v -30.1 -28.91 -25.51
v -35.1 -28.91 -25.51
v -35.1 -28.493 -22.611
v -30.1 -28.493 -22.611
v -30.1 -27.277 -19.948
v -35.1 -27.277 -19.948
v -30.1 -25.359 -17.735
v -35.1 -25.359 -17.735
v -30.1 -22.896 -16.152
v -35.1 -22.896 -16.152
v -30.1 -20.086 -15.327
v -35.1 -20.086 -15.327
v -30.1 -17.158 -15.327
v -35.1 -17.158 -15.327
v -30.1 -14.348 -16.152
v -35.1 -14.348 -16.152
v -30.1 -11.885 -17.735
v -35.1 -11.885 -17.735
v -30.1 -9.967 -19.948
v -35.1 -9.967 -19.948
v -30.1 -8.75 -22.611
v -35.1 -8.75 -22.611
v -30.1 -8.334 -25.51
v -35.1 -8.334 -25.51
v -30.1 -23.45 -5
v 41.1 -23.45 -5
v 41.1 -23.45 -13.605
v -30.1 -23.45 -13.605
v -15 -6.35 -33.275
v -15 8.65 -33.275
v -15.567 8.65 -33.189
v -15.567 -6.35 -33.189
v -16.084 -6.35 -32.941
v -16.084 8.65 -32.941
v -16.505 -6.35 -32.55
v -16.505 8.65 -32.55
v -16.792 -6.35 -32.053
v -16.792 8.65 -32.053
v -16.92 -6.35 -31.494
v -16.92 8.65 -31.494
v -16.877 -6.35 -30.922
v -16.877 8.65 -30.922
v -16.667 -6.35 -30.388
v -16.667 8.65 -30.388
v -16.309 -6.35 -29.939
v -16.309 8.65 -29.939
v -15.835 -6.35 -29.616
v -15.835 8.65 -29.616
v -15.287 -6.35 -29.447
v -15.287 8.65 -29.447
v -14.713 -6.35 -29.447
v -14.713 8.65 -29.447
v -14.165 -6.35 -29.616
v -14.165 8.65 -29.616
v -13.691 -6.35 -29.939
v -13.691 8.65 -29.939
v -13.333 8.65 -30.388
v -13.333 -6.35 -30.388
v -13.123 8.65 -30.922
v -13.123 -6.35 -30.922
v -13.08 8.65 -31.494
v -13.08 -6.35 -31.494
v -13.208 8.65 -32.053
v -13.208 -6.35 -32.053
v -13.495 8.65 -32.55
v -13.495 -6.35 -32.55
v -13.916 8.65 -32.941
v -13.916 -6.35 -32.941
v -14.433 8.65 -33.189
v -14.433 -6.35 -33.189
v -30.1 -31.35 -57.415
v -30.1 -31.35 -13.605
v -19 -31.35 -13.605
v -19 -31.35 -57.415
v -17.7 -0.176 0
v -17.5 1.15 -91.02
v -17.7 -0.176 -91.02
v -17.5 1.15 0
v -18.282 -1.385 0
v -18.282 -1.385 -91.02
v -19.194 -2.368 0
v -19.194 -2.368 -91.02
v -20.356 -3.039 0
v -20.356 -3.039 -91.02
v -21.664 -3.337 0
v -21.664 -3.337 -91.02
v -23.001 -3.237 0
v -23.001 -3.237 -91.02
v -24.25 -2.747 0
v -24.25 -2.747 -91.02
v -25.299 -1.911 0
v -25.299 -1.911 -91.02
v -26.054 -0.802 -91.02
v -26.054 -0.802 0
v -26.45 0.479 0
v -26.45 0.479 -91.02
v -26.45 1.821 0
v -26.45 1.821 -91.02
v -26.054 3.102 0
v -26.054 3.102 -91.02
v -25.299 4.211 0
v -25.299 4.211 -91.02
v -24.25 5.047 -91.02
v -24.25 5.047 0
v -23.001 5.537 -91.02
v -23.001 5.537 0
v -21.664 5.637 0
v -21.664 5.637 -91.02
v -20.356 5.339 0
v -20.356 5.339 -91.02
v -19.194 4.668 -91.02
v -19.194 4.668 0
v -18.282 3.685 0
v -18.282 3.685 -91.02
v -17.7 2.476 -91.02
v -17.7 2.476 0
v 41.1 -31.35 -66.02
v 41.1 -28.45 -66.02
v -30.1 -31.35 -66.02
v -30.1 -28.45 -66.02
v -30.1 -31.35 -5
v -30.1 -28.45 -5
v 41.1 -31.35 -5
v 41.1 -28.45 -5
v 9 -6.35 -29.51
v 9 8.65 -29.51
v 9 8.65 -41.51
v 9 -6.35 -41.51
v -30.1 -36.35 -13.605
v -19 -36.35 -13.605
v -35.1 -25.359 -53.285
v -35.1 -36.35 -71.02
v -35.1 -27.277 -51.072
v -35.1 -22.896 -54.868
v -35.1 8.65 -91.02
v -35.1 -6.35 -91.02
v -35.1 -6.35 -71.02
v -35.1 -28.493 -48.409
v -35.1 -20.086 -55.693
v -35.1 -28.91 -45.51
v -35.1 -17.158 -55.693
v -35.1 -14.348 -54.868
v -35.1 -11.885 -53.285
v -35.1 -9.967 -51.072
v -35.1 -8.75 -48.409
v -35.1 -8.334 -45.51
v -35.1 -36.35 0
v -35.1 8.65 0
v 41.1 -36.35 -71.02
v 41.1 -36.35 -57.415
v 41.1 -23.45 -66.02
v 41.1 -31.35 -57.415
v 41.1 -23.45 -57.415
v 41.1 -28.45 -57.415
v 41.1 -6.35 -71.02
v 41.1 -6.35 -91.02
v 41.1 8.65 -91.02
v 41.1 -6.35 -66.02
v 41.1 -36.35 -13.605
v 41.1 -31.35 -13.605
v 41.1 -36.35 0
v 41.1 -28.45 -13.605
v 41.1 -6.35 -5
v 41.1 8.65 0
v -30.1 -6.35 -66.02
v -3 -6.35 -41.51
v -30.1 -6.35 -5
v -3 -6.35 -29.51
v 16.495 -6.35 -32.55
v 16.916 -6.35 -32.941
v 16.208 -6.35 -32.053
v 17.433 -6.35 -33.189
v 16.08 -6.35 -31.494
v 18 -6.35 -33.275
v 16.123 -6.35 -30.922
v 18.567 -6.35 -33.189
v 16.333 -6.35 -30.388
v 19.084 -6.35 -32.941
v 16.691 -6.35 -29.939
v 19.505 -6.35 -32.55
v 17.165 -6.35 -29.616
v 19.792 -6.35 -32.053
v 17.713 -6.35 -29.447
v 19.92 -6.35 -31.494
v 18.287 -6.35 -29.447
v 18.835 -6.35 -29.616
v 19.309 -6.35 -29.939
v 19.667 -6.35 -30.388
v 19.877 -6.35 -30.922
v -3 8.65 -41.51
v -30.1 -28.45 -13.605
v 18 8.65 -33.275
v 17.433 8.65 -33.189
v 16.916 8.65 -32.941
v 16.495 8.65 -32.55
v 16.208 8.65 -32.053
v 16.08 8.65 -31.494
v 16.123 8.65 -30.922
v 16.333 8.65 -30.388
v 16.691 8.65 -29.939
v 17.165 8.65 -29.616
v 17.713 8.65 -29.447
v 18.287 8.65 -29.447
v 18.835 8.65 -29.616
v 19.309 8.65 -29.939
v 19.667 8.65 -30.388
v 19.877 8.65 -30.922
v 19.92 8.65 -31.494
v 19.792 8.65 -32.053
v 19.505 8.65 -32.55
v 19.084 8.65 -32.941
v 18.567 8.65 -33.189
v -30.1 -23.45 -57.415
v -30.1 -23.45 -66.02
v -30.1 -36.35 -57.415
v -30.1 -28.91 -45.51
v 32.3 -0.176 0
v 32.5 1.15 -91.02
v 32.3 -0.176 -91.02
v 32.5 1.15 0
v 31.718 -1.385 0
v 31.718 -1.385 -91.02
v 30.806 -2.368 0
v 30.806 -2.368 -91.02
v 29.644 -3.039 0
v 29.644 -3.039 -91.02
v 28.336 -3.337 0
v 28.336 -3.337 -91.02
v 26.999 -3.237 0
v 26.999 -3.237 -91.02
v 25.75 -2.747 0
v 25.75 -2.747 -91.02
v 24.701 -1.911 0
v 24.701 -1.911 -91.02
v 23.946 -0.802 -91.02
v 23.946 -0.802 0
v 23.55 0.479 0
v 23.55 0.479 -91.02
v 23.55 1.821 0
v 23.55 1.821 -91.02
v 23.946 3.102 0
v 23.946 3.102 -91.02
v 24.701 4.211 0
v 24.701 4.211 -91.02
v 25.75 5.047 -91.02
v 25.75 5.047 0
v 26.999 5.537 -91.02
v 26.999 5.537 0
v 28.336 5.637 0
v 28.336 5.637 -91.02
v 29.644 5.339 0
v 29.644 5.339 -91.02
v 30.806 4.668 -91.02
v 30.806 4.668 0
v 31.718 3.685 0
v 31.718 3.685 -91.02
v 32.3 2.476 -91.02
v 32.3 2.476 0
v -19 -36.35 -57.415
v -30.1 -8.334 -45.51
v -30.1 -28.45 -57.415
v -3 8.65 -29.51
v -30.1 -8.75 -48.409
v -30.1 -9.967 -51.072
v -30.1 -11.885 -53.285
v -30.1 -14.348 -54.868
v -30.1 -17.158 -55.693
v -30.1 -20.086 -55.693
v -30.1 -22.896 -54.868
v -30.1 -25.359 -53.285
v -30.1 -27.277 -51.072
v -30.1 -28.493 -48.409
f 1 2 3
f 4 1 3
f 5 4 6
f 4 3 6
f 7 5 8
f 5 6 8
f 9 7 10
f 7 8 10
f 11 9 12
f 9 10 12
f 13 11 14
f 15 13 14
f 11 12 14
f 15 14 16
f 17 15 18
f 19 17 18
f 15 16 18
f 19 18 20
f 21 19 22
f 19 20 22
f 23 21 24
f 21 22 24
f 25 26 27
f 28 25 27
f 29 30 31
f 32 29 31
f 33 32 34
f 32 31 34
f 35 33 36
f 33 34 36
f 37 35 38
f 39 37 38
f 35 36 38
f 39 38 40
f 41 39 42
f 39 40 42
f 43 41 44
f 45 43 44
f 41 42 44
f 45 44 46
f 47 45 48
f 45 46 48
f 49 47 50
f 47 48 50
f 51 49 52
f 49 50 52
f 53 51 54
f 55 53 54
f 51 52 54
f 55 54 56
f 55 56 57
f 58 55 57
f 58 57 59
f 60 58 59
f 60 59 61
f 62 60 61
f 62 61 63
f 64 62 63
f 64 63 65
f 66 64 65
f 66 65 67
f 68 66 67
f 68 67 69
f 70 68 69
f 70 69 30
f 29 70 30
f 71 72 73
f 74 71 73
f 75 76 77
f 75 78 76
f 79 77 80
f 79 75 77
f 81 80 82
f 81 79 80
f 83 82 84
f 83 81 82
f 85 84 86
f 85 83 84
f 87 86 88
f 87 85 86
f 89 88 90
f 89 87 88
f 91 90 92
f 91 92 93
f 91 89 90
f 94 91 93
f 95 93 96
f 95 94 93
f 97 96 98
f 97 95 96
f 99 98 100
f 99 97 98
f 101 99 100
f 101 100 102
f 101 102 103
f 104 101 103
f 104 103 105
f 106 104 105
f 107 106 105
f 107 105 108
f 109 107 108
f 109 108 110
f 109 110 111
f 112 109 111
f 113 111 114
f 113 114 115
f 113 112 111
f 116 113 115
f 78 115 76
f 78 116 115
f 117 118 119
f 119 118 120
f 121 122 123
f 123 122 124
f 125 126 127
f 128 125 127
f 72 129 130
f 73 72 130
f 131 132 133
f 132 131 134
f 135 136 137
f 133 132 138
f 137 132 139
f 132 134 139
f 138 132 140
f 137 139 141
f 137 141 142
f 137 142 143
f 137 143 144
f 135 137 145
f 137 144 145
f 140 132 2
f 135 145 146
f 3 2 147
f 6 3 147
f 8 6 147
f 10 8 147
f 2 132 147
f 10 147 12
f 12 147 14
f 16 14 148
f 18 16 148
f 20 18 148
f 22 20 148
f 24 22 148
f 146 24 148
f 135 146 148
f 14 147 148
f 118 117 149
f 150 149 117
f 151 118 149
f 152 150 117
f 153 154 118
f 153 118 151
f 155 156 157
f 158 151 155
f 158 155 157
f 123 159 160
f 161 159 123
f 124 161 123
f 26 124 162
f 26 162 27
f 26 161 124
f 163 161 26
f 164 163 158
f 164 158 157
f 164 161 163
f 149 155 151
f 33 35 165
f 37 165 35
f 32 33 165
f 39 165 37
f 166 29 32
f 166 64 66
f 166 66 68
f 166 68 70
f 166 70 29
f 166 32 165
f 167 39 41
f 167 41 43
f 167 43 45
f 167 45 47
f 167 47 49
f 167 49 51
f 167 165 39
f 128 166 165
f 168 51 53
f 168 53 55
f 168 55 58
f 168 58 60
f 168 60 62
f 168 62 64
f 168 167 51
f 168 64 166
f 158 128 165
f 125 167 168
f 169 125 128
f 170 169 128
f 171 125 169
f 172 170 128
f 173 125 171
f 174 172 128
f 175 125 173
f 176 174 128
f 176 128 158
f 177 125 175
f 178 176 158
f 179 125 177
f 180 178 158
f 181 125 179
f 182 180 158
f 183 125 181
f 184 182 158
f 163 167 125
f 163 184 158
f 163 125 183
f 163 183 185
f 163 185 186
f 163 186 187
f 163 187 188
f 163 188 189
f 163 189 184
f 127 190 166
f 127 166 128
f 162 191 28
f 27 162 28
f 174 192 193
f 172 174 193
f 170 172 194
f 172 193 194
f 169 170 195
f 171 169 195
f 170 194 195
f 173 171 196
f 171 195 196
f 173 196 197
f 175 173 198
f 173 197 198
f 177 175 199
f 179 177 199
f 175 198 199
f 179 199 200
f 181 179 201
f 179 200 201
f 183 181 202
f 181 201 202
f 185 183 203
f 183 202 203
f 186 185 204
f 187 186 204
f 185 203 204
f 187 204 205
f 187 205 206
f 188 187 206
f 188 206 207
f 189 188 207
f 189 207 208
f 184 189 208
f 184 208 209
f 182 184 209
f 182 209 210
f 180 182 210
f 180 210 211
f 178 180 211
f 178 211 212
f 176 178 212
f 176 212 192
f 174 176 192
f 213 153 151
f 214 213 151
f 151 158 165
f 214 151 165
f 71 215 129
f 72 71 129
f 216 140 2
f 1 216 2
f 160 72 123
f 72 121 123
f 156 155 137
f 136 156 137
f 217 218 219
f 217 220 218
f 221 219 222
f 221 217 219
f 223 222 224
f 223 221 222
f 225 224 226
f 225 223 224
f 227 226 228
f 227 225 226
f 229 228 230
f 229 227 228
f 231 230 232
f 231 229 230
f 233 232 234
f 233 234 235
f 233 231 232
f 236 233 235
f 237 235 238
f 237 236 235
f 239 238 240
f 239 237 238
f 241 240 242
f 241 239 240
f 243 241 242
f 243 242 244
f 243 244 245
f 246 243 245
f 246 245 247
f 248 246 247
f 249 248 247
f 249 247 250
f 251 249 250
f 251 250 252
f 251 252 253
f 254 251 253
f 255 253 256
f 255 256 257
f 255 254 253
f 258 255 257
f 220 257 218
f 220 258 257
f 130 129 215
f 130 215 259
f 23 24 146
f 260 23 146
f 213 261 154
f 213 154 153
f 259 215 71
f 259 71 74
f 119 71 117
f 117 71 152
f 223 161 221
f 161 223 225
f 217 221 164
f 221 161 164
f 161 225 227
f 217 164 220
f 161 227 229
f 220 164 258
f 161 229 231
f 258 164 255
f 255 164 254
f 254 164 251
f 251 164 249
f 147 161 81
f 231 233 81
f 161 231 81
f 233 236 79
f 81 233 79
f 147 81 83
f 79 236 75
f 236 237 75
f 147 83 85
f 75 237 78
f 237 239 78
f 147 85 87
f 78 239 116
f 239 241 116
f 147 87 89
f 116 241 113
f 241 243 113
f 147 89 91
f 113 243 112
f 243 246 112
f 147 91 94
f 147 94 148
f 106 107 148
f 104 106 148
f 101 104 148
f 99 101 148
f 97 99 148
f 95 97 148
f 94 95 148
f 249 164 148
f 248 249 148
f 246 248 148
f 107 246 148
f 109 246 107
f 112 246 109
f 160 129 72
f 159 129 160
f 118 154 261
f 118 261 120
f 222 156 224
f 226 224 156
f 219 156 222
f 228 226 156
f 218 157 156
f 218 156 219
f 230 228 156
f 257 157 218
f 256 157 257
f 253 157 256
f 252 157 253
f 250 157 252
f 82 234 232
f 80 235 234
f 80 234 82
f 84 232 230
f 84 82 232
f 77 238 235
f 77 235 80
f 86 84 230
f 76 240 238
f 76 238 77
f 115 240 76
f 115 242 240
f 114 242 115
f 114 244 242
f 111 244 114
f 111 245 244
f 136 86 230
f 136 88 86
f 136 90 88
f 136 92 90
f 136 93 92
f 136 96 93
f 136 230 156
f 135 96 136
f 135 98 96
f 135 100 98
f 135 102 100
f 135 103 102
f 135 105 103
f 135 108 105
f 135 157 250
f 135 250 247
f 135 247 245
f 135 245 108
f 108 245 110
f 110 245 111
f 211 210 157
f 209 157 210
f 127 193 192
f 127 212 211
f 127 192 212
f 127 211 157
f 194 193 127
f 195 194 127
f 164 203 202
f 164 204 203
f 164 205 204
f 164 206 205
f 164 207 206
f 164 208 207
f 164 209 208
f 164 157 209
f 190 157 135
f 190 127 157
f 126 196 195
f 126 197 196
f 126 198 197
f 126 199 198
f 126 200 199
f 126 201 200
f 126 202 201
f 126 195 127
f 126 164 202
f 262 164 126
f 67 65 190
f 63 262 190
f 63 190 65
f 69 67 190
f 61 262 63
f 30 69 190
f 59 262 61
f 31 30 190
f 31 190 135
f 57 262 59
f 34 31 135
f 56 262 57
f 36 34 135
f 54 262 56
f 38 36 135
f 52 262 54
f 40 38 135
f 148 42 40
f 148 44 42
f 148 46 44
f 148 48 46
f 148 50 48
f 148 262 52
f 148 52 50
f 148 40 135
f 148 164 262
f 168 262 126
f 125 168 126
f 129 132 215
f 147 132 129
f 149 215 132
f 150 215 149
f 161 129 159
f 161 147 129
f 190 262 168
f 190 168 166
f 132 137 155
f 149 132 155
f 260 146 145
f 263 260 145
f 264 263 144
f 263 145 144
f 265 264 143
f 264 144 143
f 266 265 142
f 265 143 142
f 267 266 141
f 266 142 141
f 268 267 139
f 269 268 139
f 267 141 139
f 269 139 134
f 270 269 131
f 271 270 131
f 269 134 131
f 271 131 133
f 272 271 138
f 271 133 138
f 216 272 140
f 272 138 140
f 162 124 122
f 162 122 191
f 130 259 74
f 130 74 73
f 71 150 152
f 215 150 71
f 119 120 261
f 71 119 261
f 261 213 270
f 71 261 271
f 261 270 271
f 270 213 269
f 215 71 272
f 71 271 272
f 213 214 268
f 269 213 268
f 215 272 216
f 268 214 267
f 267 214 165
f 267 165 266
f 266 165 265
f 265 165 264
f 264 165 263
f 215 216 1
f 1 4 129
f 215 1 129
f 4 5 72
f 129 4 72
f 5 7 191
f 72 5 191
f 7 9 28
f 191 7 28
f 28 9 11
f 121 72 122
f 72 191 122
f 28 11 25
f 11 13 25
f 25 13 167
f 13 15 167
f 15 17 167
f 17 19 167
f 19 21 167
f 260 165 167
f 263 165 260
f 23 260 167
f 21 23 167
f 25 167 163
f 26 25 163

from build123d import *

# Parameters (mm, degrees)
SKETCH2_W                 = 76.2
SKETCH2_H                 = 15
SKETCH2_R                 = 3.96875
TOP_FAILED_HOLES_DEPTH    = 71.02
WALLS_DEPTH               = 45
SKETCH14_R                = 4.5
ROD_HOLES_DEPTH           = 90.746158135
SKETCH15_W                = 71.2
SKETCH15_H                = 8.605
BASE_HOLD_SYRINGE_DEPTH   = 5
SKETCH16_W                = 76.2
SKETCH16_H                = 15
SKETCH16_R                = 4.5
EXTENSION_FOR_MOTOR_DEPTH = 20
TRACK_AND_SCREWS_REACH    = 111.539
SKETCH6_R                 = 1.925
SKETCH6_W                 = 12
SKETCH6_H                 = 12
SECURE_SYRING_REACH       = 126.147
SKETCH18_W                = 8.605
SKETCH18_H                = 5
CUT_EXTRUDE1_REACH        = 126.147
SKETCH22_W                = 11.1
SKETCH22_H                = 43.81
BOSS_EXTRUDE1_DEPTH       = 5


with BuildPart() as part:
    # Sketch2 → Top + failed holes (new body)
    with BuildSketch(Plane.XY):
        with Locations((3, 1.15)):
            Rectangle(SKETCH2_W, SKETCH2_H)
        with Locations((-22, 1.15)):
            Circle(SKETCH2_R, mode=Mode.SUBTRACT)
        with Locations((28, 1.15)):
            Circle(SKETCH2_R, mode=Mode.SUBTRACT)
    extrude(amount=-TOP_FAILED_HOLES_DEPTH)

    # Sketch13 → Walls (add)
    with BuildSketch(Plane(origin=(0, 8.65, 0), x_dir=(1, 0, 0), z_dir=(0, 1, 0))):
        Polygon((-35.1, 71.02), (41.1, 71.02), (41.1, 66.02), (-30.1, 66.02), (-30.1, 5), (41.1, 5), (41.1, 0), (-35.1, 0), align=None)
    extrude(amount=-WALLS_DEPTH)

    # Sketch14 → Rod Holes (cut, through all)
    with BuildSketch(Plane.XY):
        with Locations((-22, 1.15)):
            Circle(SKETCH14_R)
        with Locations((28, 1.15)):
            Circle(SKETCH14_R)
    extrude(amount=-ROD_HOLES_DEPTH, mode=Mode.SUBTRACT)

    # Sketch15 → Base hold syringe (add)
    with BuildSketch(Plane.XZ.offset(36.35)):
        Polygon((41.1, -12.083250566), (41.1, -5), (-30.1, -5), (-30.1, -13.605), (41.1, -13.605), align=None)
        Polygon((41.1, 0), (-35.1, 0), (-35.1, -12.083250566), (-35.1, -13.605), (-30.1, -13.605), (-30.1, -5), (41.1, -5), align=None)
        with Locations((5.5, -61.7175)):
            Rectangle(SKETCH15_W, SKETCH15_H)
        Polygon((-30.1, -57.415), (-35.1, -57.415), (-35.1, -71.02), (41.1, -71.02), (41.1, -66.02), (-30.1, -66.02), align=None)
    extrude(amount=-BASE_HOLD_SYRINGE_DEPTH)

    # Sketch16 → extension for motor (add)
    with BuildSketch(Plane(origin=(0, 0, -71.02), x_dir=(-1, 0, 0), z_dir=(0, 0, -1))):
        with Locations((-3, 1.15)):
            Rectangle(SKETCH16_W, SKETCH16_H)
        with Locations(Location((-28, 1.15, 0), (0, 0, 180))):
            Circle(SKETCH16_R, mode=Mode.SUBTRACT)
        with Locations(Location((22, 1.15, 0), (0, 0, 180))):
            Circle(SKETCH16_R, mode=Mode.SUBTRACT)
    extrude(amount=EXTENSION_FOR_MOTOR_DEPTH)

    # Sketch6 → Track and screws (cut, up to next)
    with BuildSketch(Plane(origin=(0, 8.65, 0), x_dir=(1, 0, 0), z_dir=(0, 1, 0)), mode=Mode.PRIVATE) as track_and_screws_sk1:
        with Locations(Location((18, 31.35, 0), (0, 0, 90))):
            Circle(SKETCH6_R)
    track_and_screws_tool1 = extrude(track_and_screws_sk1.sketch, amount=-TRACK_AND_SCREWS_REACH, mode=Mode.PRIVATE) & part.part
    # Sketch6 → Track and screws (cut, up to next)
    with BuildSketch(Plane(origin=(0, 8.65, 0), x_dir=(1, 0, 0), z_dir=(0, 1, 0)), mode=Mode.PRIVATE) as track_and_screws_sk2:
        with Locations(Location((-15, 31.35, 0), (0, 0, 90))):
            Circle(SKETCH6_R)
    track_and_screws_tool2 = extrude(track_and_screws_sk2.sketch, amount=-TRACK_AND_SCREWS_REACH, mode=Mode.PRIVATE) & part.part
    # Sketch6 → Track and screws (cut, up to next)
    with BuildSketch(Plane(origin=(0, 8.65, 0), x_dir=(1, 0, 0), z_dir=(0, 1, 0)), mode=Mode.PRIVATE) as track_and_screws_sk3:
        with Locations((3, 35.51)):
            Rectangle(SKETCH6_W, SKETCH6_H)
    track_and_screws_tool3 = extrude(track_and_screws_sk3.sketch, amount=-TRACK_AND_SCREWS_REACH, mode=Mode.PRIVATE) & part.part
    add(track_and_screws_tool1.solids().sort_by_distance((18, 8.65, -31.35))[0], mode=Mode.SUBTRACT)
    add(track_and_screws_tool2.solids().sort_by_distance((-15, 8.65, -31.35))[0], mode=Mode.SUBTRACT)
    add(track_and_screws_tool3.solids().sort_by_distance((3, 8.65, -35.51))[0], mode=Mode.SUBTRACT)

    # Sketch18 → Secure syring (add, up to next)
    with BuildSketch(Plane(origin=(41.1, 0, 0), x_dir=(0, 0, -1), z_dir=(1, 0, 0)), mode=Mode.PRIVATE) as secure_syring_sk1:
        with Locations((9.3025, -25.95)):
            Rectangle(SKETCH18_W, SKETCH18_H)
    secure_syring_tool1 = extrude(secure_syring_sk1.sketch, amount=-SECURE_SYRING_REACH, mode=Mode.PRIVATE) - part.part
    # Sketch18 → Secure syring (add, up to next)
    with BuildSketch(Plane(origin=(41.1, 0, 0), x_dir=(0, 0, -1), z_dir=(1, 0, 0)), mode=Mode.PRIVATE) as secure_syring_sk2:
        with Locations((61.7175, -25.95)):
            Rectangle(SKETCH18_W, SKETCH18_H)
    secure_syring_tool2 = extrude(secure_syring_sk2.sketch, amount=-SECURE_SYRING_REACH, mode=Mode.PRIVATE) - part.part
    add(secure_syring_tool1.solids().sort_by_distance((41.1, -25.95, -9.3025))[0])
    add(secure_syring_tool2.solids().sort_by_distance((41.1, -25.95, -61.7175))[0])

    # Sketch21 → Cut-Extrude1 (cut, up to next)
    with BuildSketch(Plane.ZY.offset(35.1), mode=Mode.PRIVATE) as cut_extrude1_sk1:
        with BuildLine():
            Line((-45.51, -28.910046273), (-25.51, -28.910046273))
            ThreePointArc((-25.51, -28.910046273), (-15.221854007, -18.62190028), (-25.51, -8.333754287))
            Line((-25.51, -8.333754287), (-45.51, -8.333754287))
            ThreePointArc((-45.51, -8.333754287), (-55.798145993, -18.62190028), (-45.51, -28.910046273))
        make_face()
    cut_extrude1_tool1 = extrude(cut_extrude1_sk1.sketch, amount=-CUT_EXTRUDE1_REACH, mode=Mode.PRIVATE) & part.part
    add(cut_extrude1_tool1.solids().sort_by_distance((-35.1, -18.6219, -35.51))[0], mode=Mode.SUBTRACT)


with BuildPart() as body_2:
    # Sketch22 → Boss-Extrude1 (new body)
    with BuildSketch(Plane.XZ.offset(36.35)):
        with Locations((-24.55, -35.51)):
            Rectangle(SKETCH22_W, SKETCH22_H)
    extrude(amount=-BOSS_EXTRUDE1_DEPTH)


solid = Compound([part.part, body_2.part])
